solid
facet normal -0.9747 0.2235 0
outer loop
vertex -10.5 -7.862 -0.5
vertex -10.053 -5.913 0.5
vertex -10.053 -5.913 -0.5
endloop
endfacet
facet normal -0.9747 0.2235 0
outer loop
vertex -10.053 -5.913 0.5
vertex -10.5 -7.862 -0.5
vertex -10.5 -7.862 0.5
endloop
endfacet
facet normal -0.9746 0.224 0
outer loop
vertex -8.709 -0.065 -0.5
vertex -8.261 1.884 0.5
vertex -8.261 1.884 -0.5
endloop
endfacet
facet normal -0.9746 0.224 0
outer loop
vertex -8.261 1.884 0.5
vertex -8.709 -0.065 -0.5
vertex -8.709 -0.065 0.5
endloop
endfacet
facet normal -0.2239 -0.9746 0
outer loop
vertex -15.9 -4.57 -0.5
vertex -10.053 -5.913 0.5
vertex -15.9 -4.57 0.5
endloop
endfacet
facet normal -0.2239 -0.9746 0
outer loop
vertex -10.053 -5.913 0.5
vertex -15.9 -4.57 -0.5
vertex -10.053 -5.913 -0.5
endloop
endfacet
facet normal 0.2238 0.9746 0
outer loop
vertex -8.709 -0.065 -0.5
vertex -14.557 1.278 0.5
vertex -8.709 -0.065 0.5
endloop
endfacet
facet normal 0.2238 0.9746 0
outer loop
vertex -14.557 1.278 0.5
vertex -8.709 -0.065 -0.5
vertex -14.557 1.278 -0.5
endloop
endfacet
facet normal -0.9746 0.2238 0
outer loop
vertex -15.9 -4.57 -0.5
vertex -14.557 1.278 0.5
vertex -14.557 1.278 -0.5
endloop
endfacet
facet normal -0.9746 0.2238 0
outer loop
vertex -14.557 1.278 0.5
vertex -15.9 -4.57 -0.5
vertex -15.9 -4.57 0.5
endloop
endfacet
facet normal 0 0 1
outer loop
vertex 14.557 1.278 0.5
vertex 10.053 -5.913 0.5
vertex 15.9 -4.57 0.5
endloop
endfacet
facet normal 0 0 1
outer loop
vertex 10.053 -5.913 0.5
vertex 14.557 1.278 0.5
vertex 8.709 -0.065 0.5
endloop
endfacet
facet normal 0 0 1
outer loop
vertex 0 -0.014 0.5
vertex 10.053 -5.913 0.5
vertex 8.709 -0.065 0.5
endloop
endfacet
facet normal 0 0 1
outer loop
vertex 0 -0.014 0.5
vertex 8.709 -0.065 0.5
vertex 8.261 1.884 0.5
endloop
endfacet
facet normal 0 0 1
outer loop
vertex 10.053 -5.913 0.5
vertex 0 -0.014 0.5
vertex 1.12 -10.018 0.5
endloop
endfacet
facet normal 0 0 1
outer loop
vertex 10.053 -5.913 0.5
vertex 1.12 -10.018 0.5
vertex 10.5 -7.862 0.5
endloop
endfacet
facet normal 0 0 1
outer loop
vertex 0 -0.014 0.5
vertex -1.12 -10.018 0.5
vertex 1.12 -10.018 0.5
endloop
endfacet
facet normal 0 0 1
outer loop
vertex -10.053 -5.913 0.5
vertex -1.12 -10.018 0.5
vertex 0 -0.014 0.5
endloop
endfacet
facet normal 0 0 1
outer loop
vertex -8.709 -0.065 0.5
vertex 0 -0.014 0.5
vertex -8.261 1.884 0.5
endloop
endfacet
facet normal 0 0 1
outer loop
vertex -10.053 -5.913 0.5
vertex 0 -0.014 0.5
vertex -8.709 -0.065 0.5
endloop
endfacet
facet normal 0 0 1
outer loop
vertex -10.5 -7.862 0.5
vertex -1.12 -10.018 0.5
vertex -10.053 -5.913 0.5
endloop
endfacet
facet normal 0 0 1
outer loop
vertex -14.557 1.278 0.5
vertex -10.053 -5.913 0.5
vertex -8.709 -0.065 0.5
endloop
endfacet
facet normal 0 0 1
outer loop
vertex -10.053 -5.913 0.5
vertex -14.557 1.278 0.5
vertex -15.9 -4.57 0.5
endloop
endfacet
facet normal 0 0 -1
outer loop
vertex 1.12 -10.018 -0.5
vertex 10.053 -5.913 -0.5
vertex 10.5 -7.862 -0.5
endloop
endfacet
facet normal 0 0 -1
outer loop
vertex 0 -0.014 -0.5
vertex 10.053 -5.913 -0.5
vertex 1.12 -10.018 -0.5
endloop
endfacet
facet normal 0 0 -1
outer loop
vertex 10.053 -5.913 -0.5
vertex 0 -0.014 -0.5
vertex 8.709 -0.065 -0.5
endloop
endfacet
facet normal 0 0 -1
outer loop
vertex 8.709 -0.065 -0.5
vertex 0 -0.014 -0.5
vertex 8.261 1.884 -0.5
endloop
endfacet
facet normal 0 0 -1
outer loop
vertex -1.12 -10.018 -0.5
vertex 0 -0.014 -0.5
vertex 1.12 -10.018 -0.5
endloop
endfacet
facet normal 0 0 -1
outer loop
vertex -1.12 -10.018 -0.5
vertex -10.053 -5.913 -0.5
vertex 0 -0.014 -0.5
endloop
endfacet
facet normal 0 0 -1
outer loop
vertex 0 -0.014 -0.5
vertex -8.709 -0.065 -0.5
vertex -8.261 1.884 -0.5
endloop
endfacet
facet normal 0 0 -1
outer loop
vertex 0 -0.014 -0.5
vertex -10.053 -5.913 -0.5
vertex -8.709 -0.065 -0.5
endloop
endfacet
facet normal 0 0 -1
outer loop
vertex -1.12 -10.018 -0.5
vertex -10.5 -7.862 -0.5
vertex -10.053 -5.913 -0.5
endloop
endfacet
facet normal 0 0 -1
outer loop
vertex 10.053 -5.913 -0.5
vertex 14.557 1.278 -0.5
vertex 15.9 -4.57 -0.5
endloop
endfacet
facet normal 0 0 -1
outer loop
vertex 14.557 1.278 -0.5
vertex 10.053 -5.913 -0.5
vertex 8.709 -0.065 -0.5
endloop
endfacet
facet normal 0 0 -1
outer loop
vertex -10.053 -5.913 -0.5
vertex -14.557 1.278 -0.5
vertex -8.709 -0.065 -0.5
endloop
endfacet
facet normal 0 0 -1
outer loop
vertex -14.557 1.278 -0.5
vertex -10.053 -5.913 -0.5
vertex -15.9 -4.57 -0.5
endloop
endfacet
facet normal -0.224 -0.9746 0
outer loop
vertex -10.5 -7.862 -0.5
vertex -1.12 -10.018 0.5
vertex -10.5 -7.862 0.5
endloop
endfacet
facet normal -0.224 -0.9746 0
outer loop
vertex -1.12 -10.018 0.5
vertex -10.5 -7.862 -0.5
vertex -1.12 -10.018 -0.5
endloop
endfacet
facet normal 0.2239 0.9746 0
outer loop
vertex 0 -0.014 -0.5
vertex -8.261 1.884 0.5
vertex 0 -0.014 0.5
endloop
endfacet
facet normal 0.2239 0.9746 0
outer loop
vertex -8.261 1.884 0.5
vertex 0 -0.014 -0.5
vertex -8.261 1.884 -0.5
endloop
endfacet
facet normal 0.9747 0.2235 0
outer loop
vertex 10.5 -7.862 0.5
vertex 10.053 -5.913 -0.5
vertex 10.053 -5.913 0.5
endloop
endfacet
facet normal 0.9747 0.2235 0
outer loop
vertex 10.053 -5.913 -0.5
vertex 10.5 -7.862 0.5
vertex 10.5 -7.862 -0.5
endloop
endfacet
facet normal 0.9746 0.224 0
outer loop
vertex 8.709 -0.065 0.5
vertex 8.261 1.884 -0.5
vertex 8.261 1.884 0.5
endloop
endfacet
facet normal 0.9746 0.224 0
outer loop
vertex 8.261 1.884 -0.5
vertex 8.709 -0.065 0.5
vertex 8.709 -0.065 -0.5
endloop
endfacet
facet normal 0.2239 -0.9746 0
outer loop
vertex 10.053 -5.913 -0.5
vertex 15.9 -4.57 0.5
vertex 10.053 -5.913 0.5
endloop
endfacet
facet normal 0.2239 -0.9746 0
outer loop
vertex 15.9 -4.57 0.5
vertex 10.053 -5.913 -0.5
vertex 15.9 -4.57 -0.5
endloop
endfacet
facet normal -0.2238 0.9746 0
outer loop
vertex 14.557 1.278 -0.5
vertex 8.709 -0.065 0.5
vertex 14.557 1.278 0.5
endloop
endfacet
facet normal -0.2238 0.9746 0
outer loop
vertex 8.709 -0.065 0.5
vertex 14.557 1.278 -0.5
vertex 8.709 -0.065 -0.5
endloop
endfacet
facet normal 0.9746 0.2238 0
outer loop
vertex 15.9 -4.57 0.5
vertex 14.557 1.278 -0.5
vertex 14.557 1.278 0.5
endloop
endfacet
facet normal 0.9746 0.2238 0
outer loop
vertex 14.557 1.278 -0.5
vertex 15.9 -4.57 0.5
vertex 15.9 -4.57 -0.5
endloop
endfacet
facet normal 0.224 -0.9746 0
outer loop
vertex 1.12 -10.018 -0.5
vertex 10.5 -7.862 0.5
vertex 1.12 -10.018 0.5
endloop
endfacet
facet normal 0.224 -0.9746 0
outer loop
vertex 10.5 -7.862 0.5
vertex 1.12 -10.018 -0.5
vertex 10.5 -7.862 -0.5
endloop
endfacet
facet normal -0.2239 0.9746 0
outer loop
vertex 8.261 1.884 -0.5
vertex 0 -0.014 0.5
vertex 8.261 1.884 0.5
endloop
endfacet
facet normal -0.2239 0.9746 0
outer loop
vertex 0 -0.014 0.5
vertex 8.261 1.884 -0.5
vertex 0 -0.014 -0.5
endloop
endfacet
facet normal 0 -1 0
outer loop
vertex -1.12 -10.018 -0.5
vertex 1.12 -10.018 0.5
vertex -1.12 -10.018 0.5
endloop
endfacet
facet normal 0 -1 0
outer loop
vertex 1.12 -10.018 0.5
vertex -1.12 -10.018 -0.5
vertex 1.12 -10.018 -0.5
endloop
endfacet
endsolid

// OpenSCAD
// Ssymmank lamp -- CONNECTOR bar (one of 60, all identical).
// Flat, shallow-V fin with a keyed tenon at each end; plugs into two neighbouring
// tiles' corner mortises.  Lay flat (fin in the XY plane) to print.
// Modules/params come from star.scad, so edits there propagate here.

include <star.scad>
SHOW_STAR = false;   // library mode: don't draw the lone star tile

rotate([90, 0, 0]) connector();   // fin laid flat on the bed
